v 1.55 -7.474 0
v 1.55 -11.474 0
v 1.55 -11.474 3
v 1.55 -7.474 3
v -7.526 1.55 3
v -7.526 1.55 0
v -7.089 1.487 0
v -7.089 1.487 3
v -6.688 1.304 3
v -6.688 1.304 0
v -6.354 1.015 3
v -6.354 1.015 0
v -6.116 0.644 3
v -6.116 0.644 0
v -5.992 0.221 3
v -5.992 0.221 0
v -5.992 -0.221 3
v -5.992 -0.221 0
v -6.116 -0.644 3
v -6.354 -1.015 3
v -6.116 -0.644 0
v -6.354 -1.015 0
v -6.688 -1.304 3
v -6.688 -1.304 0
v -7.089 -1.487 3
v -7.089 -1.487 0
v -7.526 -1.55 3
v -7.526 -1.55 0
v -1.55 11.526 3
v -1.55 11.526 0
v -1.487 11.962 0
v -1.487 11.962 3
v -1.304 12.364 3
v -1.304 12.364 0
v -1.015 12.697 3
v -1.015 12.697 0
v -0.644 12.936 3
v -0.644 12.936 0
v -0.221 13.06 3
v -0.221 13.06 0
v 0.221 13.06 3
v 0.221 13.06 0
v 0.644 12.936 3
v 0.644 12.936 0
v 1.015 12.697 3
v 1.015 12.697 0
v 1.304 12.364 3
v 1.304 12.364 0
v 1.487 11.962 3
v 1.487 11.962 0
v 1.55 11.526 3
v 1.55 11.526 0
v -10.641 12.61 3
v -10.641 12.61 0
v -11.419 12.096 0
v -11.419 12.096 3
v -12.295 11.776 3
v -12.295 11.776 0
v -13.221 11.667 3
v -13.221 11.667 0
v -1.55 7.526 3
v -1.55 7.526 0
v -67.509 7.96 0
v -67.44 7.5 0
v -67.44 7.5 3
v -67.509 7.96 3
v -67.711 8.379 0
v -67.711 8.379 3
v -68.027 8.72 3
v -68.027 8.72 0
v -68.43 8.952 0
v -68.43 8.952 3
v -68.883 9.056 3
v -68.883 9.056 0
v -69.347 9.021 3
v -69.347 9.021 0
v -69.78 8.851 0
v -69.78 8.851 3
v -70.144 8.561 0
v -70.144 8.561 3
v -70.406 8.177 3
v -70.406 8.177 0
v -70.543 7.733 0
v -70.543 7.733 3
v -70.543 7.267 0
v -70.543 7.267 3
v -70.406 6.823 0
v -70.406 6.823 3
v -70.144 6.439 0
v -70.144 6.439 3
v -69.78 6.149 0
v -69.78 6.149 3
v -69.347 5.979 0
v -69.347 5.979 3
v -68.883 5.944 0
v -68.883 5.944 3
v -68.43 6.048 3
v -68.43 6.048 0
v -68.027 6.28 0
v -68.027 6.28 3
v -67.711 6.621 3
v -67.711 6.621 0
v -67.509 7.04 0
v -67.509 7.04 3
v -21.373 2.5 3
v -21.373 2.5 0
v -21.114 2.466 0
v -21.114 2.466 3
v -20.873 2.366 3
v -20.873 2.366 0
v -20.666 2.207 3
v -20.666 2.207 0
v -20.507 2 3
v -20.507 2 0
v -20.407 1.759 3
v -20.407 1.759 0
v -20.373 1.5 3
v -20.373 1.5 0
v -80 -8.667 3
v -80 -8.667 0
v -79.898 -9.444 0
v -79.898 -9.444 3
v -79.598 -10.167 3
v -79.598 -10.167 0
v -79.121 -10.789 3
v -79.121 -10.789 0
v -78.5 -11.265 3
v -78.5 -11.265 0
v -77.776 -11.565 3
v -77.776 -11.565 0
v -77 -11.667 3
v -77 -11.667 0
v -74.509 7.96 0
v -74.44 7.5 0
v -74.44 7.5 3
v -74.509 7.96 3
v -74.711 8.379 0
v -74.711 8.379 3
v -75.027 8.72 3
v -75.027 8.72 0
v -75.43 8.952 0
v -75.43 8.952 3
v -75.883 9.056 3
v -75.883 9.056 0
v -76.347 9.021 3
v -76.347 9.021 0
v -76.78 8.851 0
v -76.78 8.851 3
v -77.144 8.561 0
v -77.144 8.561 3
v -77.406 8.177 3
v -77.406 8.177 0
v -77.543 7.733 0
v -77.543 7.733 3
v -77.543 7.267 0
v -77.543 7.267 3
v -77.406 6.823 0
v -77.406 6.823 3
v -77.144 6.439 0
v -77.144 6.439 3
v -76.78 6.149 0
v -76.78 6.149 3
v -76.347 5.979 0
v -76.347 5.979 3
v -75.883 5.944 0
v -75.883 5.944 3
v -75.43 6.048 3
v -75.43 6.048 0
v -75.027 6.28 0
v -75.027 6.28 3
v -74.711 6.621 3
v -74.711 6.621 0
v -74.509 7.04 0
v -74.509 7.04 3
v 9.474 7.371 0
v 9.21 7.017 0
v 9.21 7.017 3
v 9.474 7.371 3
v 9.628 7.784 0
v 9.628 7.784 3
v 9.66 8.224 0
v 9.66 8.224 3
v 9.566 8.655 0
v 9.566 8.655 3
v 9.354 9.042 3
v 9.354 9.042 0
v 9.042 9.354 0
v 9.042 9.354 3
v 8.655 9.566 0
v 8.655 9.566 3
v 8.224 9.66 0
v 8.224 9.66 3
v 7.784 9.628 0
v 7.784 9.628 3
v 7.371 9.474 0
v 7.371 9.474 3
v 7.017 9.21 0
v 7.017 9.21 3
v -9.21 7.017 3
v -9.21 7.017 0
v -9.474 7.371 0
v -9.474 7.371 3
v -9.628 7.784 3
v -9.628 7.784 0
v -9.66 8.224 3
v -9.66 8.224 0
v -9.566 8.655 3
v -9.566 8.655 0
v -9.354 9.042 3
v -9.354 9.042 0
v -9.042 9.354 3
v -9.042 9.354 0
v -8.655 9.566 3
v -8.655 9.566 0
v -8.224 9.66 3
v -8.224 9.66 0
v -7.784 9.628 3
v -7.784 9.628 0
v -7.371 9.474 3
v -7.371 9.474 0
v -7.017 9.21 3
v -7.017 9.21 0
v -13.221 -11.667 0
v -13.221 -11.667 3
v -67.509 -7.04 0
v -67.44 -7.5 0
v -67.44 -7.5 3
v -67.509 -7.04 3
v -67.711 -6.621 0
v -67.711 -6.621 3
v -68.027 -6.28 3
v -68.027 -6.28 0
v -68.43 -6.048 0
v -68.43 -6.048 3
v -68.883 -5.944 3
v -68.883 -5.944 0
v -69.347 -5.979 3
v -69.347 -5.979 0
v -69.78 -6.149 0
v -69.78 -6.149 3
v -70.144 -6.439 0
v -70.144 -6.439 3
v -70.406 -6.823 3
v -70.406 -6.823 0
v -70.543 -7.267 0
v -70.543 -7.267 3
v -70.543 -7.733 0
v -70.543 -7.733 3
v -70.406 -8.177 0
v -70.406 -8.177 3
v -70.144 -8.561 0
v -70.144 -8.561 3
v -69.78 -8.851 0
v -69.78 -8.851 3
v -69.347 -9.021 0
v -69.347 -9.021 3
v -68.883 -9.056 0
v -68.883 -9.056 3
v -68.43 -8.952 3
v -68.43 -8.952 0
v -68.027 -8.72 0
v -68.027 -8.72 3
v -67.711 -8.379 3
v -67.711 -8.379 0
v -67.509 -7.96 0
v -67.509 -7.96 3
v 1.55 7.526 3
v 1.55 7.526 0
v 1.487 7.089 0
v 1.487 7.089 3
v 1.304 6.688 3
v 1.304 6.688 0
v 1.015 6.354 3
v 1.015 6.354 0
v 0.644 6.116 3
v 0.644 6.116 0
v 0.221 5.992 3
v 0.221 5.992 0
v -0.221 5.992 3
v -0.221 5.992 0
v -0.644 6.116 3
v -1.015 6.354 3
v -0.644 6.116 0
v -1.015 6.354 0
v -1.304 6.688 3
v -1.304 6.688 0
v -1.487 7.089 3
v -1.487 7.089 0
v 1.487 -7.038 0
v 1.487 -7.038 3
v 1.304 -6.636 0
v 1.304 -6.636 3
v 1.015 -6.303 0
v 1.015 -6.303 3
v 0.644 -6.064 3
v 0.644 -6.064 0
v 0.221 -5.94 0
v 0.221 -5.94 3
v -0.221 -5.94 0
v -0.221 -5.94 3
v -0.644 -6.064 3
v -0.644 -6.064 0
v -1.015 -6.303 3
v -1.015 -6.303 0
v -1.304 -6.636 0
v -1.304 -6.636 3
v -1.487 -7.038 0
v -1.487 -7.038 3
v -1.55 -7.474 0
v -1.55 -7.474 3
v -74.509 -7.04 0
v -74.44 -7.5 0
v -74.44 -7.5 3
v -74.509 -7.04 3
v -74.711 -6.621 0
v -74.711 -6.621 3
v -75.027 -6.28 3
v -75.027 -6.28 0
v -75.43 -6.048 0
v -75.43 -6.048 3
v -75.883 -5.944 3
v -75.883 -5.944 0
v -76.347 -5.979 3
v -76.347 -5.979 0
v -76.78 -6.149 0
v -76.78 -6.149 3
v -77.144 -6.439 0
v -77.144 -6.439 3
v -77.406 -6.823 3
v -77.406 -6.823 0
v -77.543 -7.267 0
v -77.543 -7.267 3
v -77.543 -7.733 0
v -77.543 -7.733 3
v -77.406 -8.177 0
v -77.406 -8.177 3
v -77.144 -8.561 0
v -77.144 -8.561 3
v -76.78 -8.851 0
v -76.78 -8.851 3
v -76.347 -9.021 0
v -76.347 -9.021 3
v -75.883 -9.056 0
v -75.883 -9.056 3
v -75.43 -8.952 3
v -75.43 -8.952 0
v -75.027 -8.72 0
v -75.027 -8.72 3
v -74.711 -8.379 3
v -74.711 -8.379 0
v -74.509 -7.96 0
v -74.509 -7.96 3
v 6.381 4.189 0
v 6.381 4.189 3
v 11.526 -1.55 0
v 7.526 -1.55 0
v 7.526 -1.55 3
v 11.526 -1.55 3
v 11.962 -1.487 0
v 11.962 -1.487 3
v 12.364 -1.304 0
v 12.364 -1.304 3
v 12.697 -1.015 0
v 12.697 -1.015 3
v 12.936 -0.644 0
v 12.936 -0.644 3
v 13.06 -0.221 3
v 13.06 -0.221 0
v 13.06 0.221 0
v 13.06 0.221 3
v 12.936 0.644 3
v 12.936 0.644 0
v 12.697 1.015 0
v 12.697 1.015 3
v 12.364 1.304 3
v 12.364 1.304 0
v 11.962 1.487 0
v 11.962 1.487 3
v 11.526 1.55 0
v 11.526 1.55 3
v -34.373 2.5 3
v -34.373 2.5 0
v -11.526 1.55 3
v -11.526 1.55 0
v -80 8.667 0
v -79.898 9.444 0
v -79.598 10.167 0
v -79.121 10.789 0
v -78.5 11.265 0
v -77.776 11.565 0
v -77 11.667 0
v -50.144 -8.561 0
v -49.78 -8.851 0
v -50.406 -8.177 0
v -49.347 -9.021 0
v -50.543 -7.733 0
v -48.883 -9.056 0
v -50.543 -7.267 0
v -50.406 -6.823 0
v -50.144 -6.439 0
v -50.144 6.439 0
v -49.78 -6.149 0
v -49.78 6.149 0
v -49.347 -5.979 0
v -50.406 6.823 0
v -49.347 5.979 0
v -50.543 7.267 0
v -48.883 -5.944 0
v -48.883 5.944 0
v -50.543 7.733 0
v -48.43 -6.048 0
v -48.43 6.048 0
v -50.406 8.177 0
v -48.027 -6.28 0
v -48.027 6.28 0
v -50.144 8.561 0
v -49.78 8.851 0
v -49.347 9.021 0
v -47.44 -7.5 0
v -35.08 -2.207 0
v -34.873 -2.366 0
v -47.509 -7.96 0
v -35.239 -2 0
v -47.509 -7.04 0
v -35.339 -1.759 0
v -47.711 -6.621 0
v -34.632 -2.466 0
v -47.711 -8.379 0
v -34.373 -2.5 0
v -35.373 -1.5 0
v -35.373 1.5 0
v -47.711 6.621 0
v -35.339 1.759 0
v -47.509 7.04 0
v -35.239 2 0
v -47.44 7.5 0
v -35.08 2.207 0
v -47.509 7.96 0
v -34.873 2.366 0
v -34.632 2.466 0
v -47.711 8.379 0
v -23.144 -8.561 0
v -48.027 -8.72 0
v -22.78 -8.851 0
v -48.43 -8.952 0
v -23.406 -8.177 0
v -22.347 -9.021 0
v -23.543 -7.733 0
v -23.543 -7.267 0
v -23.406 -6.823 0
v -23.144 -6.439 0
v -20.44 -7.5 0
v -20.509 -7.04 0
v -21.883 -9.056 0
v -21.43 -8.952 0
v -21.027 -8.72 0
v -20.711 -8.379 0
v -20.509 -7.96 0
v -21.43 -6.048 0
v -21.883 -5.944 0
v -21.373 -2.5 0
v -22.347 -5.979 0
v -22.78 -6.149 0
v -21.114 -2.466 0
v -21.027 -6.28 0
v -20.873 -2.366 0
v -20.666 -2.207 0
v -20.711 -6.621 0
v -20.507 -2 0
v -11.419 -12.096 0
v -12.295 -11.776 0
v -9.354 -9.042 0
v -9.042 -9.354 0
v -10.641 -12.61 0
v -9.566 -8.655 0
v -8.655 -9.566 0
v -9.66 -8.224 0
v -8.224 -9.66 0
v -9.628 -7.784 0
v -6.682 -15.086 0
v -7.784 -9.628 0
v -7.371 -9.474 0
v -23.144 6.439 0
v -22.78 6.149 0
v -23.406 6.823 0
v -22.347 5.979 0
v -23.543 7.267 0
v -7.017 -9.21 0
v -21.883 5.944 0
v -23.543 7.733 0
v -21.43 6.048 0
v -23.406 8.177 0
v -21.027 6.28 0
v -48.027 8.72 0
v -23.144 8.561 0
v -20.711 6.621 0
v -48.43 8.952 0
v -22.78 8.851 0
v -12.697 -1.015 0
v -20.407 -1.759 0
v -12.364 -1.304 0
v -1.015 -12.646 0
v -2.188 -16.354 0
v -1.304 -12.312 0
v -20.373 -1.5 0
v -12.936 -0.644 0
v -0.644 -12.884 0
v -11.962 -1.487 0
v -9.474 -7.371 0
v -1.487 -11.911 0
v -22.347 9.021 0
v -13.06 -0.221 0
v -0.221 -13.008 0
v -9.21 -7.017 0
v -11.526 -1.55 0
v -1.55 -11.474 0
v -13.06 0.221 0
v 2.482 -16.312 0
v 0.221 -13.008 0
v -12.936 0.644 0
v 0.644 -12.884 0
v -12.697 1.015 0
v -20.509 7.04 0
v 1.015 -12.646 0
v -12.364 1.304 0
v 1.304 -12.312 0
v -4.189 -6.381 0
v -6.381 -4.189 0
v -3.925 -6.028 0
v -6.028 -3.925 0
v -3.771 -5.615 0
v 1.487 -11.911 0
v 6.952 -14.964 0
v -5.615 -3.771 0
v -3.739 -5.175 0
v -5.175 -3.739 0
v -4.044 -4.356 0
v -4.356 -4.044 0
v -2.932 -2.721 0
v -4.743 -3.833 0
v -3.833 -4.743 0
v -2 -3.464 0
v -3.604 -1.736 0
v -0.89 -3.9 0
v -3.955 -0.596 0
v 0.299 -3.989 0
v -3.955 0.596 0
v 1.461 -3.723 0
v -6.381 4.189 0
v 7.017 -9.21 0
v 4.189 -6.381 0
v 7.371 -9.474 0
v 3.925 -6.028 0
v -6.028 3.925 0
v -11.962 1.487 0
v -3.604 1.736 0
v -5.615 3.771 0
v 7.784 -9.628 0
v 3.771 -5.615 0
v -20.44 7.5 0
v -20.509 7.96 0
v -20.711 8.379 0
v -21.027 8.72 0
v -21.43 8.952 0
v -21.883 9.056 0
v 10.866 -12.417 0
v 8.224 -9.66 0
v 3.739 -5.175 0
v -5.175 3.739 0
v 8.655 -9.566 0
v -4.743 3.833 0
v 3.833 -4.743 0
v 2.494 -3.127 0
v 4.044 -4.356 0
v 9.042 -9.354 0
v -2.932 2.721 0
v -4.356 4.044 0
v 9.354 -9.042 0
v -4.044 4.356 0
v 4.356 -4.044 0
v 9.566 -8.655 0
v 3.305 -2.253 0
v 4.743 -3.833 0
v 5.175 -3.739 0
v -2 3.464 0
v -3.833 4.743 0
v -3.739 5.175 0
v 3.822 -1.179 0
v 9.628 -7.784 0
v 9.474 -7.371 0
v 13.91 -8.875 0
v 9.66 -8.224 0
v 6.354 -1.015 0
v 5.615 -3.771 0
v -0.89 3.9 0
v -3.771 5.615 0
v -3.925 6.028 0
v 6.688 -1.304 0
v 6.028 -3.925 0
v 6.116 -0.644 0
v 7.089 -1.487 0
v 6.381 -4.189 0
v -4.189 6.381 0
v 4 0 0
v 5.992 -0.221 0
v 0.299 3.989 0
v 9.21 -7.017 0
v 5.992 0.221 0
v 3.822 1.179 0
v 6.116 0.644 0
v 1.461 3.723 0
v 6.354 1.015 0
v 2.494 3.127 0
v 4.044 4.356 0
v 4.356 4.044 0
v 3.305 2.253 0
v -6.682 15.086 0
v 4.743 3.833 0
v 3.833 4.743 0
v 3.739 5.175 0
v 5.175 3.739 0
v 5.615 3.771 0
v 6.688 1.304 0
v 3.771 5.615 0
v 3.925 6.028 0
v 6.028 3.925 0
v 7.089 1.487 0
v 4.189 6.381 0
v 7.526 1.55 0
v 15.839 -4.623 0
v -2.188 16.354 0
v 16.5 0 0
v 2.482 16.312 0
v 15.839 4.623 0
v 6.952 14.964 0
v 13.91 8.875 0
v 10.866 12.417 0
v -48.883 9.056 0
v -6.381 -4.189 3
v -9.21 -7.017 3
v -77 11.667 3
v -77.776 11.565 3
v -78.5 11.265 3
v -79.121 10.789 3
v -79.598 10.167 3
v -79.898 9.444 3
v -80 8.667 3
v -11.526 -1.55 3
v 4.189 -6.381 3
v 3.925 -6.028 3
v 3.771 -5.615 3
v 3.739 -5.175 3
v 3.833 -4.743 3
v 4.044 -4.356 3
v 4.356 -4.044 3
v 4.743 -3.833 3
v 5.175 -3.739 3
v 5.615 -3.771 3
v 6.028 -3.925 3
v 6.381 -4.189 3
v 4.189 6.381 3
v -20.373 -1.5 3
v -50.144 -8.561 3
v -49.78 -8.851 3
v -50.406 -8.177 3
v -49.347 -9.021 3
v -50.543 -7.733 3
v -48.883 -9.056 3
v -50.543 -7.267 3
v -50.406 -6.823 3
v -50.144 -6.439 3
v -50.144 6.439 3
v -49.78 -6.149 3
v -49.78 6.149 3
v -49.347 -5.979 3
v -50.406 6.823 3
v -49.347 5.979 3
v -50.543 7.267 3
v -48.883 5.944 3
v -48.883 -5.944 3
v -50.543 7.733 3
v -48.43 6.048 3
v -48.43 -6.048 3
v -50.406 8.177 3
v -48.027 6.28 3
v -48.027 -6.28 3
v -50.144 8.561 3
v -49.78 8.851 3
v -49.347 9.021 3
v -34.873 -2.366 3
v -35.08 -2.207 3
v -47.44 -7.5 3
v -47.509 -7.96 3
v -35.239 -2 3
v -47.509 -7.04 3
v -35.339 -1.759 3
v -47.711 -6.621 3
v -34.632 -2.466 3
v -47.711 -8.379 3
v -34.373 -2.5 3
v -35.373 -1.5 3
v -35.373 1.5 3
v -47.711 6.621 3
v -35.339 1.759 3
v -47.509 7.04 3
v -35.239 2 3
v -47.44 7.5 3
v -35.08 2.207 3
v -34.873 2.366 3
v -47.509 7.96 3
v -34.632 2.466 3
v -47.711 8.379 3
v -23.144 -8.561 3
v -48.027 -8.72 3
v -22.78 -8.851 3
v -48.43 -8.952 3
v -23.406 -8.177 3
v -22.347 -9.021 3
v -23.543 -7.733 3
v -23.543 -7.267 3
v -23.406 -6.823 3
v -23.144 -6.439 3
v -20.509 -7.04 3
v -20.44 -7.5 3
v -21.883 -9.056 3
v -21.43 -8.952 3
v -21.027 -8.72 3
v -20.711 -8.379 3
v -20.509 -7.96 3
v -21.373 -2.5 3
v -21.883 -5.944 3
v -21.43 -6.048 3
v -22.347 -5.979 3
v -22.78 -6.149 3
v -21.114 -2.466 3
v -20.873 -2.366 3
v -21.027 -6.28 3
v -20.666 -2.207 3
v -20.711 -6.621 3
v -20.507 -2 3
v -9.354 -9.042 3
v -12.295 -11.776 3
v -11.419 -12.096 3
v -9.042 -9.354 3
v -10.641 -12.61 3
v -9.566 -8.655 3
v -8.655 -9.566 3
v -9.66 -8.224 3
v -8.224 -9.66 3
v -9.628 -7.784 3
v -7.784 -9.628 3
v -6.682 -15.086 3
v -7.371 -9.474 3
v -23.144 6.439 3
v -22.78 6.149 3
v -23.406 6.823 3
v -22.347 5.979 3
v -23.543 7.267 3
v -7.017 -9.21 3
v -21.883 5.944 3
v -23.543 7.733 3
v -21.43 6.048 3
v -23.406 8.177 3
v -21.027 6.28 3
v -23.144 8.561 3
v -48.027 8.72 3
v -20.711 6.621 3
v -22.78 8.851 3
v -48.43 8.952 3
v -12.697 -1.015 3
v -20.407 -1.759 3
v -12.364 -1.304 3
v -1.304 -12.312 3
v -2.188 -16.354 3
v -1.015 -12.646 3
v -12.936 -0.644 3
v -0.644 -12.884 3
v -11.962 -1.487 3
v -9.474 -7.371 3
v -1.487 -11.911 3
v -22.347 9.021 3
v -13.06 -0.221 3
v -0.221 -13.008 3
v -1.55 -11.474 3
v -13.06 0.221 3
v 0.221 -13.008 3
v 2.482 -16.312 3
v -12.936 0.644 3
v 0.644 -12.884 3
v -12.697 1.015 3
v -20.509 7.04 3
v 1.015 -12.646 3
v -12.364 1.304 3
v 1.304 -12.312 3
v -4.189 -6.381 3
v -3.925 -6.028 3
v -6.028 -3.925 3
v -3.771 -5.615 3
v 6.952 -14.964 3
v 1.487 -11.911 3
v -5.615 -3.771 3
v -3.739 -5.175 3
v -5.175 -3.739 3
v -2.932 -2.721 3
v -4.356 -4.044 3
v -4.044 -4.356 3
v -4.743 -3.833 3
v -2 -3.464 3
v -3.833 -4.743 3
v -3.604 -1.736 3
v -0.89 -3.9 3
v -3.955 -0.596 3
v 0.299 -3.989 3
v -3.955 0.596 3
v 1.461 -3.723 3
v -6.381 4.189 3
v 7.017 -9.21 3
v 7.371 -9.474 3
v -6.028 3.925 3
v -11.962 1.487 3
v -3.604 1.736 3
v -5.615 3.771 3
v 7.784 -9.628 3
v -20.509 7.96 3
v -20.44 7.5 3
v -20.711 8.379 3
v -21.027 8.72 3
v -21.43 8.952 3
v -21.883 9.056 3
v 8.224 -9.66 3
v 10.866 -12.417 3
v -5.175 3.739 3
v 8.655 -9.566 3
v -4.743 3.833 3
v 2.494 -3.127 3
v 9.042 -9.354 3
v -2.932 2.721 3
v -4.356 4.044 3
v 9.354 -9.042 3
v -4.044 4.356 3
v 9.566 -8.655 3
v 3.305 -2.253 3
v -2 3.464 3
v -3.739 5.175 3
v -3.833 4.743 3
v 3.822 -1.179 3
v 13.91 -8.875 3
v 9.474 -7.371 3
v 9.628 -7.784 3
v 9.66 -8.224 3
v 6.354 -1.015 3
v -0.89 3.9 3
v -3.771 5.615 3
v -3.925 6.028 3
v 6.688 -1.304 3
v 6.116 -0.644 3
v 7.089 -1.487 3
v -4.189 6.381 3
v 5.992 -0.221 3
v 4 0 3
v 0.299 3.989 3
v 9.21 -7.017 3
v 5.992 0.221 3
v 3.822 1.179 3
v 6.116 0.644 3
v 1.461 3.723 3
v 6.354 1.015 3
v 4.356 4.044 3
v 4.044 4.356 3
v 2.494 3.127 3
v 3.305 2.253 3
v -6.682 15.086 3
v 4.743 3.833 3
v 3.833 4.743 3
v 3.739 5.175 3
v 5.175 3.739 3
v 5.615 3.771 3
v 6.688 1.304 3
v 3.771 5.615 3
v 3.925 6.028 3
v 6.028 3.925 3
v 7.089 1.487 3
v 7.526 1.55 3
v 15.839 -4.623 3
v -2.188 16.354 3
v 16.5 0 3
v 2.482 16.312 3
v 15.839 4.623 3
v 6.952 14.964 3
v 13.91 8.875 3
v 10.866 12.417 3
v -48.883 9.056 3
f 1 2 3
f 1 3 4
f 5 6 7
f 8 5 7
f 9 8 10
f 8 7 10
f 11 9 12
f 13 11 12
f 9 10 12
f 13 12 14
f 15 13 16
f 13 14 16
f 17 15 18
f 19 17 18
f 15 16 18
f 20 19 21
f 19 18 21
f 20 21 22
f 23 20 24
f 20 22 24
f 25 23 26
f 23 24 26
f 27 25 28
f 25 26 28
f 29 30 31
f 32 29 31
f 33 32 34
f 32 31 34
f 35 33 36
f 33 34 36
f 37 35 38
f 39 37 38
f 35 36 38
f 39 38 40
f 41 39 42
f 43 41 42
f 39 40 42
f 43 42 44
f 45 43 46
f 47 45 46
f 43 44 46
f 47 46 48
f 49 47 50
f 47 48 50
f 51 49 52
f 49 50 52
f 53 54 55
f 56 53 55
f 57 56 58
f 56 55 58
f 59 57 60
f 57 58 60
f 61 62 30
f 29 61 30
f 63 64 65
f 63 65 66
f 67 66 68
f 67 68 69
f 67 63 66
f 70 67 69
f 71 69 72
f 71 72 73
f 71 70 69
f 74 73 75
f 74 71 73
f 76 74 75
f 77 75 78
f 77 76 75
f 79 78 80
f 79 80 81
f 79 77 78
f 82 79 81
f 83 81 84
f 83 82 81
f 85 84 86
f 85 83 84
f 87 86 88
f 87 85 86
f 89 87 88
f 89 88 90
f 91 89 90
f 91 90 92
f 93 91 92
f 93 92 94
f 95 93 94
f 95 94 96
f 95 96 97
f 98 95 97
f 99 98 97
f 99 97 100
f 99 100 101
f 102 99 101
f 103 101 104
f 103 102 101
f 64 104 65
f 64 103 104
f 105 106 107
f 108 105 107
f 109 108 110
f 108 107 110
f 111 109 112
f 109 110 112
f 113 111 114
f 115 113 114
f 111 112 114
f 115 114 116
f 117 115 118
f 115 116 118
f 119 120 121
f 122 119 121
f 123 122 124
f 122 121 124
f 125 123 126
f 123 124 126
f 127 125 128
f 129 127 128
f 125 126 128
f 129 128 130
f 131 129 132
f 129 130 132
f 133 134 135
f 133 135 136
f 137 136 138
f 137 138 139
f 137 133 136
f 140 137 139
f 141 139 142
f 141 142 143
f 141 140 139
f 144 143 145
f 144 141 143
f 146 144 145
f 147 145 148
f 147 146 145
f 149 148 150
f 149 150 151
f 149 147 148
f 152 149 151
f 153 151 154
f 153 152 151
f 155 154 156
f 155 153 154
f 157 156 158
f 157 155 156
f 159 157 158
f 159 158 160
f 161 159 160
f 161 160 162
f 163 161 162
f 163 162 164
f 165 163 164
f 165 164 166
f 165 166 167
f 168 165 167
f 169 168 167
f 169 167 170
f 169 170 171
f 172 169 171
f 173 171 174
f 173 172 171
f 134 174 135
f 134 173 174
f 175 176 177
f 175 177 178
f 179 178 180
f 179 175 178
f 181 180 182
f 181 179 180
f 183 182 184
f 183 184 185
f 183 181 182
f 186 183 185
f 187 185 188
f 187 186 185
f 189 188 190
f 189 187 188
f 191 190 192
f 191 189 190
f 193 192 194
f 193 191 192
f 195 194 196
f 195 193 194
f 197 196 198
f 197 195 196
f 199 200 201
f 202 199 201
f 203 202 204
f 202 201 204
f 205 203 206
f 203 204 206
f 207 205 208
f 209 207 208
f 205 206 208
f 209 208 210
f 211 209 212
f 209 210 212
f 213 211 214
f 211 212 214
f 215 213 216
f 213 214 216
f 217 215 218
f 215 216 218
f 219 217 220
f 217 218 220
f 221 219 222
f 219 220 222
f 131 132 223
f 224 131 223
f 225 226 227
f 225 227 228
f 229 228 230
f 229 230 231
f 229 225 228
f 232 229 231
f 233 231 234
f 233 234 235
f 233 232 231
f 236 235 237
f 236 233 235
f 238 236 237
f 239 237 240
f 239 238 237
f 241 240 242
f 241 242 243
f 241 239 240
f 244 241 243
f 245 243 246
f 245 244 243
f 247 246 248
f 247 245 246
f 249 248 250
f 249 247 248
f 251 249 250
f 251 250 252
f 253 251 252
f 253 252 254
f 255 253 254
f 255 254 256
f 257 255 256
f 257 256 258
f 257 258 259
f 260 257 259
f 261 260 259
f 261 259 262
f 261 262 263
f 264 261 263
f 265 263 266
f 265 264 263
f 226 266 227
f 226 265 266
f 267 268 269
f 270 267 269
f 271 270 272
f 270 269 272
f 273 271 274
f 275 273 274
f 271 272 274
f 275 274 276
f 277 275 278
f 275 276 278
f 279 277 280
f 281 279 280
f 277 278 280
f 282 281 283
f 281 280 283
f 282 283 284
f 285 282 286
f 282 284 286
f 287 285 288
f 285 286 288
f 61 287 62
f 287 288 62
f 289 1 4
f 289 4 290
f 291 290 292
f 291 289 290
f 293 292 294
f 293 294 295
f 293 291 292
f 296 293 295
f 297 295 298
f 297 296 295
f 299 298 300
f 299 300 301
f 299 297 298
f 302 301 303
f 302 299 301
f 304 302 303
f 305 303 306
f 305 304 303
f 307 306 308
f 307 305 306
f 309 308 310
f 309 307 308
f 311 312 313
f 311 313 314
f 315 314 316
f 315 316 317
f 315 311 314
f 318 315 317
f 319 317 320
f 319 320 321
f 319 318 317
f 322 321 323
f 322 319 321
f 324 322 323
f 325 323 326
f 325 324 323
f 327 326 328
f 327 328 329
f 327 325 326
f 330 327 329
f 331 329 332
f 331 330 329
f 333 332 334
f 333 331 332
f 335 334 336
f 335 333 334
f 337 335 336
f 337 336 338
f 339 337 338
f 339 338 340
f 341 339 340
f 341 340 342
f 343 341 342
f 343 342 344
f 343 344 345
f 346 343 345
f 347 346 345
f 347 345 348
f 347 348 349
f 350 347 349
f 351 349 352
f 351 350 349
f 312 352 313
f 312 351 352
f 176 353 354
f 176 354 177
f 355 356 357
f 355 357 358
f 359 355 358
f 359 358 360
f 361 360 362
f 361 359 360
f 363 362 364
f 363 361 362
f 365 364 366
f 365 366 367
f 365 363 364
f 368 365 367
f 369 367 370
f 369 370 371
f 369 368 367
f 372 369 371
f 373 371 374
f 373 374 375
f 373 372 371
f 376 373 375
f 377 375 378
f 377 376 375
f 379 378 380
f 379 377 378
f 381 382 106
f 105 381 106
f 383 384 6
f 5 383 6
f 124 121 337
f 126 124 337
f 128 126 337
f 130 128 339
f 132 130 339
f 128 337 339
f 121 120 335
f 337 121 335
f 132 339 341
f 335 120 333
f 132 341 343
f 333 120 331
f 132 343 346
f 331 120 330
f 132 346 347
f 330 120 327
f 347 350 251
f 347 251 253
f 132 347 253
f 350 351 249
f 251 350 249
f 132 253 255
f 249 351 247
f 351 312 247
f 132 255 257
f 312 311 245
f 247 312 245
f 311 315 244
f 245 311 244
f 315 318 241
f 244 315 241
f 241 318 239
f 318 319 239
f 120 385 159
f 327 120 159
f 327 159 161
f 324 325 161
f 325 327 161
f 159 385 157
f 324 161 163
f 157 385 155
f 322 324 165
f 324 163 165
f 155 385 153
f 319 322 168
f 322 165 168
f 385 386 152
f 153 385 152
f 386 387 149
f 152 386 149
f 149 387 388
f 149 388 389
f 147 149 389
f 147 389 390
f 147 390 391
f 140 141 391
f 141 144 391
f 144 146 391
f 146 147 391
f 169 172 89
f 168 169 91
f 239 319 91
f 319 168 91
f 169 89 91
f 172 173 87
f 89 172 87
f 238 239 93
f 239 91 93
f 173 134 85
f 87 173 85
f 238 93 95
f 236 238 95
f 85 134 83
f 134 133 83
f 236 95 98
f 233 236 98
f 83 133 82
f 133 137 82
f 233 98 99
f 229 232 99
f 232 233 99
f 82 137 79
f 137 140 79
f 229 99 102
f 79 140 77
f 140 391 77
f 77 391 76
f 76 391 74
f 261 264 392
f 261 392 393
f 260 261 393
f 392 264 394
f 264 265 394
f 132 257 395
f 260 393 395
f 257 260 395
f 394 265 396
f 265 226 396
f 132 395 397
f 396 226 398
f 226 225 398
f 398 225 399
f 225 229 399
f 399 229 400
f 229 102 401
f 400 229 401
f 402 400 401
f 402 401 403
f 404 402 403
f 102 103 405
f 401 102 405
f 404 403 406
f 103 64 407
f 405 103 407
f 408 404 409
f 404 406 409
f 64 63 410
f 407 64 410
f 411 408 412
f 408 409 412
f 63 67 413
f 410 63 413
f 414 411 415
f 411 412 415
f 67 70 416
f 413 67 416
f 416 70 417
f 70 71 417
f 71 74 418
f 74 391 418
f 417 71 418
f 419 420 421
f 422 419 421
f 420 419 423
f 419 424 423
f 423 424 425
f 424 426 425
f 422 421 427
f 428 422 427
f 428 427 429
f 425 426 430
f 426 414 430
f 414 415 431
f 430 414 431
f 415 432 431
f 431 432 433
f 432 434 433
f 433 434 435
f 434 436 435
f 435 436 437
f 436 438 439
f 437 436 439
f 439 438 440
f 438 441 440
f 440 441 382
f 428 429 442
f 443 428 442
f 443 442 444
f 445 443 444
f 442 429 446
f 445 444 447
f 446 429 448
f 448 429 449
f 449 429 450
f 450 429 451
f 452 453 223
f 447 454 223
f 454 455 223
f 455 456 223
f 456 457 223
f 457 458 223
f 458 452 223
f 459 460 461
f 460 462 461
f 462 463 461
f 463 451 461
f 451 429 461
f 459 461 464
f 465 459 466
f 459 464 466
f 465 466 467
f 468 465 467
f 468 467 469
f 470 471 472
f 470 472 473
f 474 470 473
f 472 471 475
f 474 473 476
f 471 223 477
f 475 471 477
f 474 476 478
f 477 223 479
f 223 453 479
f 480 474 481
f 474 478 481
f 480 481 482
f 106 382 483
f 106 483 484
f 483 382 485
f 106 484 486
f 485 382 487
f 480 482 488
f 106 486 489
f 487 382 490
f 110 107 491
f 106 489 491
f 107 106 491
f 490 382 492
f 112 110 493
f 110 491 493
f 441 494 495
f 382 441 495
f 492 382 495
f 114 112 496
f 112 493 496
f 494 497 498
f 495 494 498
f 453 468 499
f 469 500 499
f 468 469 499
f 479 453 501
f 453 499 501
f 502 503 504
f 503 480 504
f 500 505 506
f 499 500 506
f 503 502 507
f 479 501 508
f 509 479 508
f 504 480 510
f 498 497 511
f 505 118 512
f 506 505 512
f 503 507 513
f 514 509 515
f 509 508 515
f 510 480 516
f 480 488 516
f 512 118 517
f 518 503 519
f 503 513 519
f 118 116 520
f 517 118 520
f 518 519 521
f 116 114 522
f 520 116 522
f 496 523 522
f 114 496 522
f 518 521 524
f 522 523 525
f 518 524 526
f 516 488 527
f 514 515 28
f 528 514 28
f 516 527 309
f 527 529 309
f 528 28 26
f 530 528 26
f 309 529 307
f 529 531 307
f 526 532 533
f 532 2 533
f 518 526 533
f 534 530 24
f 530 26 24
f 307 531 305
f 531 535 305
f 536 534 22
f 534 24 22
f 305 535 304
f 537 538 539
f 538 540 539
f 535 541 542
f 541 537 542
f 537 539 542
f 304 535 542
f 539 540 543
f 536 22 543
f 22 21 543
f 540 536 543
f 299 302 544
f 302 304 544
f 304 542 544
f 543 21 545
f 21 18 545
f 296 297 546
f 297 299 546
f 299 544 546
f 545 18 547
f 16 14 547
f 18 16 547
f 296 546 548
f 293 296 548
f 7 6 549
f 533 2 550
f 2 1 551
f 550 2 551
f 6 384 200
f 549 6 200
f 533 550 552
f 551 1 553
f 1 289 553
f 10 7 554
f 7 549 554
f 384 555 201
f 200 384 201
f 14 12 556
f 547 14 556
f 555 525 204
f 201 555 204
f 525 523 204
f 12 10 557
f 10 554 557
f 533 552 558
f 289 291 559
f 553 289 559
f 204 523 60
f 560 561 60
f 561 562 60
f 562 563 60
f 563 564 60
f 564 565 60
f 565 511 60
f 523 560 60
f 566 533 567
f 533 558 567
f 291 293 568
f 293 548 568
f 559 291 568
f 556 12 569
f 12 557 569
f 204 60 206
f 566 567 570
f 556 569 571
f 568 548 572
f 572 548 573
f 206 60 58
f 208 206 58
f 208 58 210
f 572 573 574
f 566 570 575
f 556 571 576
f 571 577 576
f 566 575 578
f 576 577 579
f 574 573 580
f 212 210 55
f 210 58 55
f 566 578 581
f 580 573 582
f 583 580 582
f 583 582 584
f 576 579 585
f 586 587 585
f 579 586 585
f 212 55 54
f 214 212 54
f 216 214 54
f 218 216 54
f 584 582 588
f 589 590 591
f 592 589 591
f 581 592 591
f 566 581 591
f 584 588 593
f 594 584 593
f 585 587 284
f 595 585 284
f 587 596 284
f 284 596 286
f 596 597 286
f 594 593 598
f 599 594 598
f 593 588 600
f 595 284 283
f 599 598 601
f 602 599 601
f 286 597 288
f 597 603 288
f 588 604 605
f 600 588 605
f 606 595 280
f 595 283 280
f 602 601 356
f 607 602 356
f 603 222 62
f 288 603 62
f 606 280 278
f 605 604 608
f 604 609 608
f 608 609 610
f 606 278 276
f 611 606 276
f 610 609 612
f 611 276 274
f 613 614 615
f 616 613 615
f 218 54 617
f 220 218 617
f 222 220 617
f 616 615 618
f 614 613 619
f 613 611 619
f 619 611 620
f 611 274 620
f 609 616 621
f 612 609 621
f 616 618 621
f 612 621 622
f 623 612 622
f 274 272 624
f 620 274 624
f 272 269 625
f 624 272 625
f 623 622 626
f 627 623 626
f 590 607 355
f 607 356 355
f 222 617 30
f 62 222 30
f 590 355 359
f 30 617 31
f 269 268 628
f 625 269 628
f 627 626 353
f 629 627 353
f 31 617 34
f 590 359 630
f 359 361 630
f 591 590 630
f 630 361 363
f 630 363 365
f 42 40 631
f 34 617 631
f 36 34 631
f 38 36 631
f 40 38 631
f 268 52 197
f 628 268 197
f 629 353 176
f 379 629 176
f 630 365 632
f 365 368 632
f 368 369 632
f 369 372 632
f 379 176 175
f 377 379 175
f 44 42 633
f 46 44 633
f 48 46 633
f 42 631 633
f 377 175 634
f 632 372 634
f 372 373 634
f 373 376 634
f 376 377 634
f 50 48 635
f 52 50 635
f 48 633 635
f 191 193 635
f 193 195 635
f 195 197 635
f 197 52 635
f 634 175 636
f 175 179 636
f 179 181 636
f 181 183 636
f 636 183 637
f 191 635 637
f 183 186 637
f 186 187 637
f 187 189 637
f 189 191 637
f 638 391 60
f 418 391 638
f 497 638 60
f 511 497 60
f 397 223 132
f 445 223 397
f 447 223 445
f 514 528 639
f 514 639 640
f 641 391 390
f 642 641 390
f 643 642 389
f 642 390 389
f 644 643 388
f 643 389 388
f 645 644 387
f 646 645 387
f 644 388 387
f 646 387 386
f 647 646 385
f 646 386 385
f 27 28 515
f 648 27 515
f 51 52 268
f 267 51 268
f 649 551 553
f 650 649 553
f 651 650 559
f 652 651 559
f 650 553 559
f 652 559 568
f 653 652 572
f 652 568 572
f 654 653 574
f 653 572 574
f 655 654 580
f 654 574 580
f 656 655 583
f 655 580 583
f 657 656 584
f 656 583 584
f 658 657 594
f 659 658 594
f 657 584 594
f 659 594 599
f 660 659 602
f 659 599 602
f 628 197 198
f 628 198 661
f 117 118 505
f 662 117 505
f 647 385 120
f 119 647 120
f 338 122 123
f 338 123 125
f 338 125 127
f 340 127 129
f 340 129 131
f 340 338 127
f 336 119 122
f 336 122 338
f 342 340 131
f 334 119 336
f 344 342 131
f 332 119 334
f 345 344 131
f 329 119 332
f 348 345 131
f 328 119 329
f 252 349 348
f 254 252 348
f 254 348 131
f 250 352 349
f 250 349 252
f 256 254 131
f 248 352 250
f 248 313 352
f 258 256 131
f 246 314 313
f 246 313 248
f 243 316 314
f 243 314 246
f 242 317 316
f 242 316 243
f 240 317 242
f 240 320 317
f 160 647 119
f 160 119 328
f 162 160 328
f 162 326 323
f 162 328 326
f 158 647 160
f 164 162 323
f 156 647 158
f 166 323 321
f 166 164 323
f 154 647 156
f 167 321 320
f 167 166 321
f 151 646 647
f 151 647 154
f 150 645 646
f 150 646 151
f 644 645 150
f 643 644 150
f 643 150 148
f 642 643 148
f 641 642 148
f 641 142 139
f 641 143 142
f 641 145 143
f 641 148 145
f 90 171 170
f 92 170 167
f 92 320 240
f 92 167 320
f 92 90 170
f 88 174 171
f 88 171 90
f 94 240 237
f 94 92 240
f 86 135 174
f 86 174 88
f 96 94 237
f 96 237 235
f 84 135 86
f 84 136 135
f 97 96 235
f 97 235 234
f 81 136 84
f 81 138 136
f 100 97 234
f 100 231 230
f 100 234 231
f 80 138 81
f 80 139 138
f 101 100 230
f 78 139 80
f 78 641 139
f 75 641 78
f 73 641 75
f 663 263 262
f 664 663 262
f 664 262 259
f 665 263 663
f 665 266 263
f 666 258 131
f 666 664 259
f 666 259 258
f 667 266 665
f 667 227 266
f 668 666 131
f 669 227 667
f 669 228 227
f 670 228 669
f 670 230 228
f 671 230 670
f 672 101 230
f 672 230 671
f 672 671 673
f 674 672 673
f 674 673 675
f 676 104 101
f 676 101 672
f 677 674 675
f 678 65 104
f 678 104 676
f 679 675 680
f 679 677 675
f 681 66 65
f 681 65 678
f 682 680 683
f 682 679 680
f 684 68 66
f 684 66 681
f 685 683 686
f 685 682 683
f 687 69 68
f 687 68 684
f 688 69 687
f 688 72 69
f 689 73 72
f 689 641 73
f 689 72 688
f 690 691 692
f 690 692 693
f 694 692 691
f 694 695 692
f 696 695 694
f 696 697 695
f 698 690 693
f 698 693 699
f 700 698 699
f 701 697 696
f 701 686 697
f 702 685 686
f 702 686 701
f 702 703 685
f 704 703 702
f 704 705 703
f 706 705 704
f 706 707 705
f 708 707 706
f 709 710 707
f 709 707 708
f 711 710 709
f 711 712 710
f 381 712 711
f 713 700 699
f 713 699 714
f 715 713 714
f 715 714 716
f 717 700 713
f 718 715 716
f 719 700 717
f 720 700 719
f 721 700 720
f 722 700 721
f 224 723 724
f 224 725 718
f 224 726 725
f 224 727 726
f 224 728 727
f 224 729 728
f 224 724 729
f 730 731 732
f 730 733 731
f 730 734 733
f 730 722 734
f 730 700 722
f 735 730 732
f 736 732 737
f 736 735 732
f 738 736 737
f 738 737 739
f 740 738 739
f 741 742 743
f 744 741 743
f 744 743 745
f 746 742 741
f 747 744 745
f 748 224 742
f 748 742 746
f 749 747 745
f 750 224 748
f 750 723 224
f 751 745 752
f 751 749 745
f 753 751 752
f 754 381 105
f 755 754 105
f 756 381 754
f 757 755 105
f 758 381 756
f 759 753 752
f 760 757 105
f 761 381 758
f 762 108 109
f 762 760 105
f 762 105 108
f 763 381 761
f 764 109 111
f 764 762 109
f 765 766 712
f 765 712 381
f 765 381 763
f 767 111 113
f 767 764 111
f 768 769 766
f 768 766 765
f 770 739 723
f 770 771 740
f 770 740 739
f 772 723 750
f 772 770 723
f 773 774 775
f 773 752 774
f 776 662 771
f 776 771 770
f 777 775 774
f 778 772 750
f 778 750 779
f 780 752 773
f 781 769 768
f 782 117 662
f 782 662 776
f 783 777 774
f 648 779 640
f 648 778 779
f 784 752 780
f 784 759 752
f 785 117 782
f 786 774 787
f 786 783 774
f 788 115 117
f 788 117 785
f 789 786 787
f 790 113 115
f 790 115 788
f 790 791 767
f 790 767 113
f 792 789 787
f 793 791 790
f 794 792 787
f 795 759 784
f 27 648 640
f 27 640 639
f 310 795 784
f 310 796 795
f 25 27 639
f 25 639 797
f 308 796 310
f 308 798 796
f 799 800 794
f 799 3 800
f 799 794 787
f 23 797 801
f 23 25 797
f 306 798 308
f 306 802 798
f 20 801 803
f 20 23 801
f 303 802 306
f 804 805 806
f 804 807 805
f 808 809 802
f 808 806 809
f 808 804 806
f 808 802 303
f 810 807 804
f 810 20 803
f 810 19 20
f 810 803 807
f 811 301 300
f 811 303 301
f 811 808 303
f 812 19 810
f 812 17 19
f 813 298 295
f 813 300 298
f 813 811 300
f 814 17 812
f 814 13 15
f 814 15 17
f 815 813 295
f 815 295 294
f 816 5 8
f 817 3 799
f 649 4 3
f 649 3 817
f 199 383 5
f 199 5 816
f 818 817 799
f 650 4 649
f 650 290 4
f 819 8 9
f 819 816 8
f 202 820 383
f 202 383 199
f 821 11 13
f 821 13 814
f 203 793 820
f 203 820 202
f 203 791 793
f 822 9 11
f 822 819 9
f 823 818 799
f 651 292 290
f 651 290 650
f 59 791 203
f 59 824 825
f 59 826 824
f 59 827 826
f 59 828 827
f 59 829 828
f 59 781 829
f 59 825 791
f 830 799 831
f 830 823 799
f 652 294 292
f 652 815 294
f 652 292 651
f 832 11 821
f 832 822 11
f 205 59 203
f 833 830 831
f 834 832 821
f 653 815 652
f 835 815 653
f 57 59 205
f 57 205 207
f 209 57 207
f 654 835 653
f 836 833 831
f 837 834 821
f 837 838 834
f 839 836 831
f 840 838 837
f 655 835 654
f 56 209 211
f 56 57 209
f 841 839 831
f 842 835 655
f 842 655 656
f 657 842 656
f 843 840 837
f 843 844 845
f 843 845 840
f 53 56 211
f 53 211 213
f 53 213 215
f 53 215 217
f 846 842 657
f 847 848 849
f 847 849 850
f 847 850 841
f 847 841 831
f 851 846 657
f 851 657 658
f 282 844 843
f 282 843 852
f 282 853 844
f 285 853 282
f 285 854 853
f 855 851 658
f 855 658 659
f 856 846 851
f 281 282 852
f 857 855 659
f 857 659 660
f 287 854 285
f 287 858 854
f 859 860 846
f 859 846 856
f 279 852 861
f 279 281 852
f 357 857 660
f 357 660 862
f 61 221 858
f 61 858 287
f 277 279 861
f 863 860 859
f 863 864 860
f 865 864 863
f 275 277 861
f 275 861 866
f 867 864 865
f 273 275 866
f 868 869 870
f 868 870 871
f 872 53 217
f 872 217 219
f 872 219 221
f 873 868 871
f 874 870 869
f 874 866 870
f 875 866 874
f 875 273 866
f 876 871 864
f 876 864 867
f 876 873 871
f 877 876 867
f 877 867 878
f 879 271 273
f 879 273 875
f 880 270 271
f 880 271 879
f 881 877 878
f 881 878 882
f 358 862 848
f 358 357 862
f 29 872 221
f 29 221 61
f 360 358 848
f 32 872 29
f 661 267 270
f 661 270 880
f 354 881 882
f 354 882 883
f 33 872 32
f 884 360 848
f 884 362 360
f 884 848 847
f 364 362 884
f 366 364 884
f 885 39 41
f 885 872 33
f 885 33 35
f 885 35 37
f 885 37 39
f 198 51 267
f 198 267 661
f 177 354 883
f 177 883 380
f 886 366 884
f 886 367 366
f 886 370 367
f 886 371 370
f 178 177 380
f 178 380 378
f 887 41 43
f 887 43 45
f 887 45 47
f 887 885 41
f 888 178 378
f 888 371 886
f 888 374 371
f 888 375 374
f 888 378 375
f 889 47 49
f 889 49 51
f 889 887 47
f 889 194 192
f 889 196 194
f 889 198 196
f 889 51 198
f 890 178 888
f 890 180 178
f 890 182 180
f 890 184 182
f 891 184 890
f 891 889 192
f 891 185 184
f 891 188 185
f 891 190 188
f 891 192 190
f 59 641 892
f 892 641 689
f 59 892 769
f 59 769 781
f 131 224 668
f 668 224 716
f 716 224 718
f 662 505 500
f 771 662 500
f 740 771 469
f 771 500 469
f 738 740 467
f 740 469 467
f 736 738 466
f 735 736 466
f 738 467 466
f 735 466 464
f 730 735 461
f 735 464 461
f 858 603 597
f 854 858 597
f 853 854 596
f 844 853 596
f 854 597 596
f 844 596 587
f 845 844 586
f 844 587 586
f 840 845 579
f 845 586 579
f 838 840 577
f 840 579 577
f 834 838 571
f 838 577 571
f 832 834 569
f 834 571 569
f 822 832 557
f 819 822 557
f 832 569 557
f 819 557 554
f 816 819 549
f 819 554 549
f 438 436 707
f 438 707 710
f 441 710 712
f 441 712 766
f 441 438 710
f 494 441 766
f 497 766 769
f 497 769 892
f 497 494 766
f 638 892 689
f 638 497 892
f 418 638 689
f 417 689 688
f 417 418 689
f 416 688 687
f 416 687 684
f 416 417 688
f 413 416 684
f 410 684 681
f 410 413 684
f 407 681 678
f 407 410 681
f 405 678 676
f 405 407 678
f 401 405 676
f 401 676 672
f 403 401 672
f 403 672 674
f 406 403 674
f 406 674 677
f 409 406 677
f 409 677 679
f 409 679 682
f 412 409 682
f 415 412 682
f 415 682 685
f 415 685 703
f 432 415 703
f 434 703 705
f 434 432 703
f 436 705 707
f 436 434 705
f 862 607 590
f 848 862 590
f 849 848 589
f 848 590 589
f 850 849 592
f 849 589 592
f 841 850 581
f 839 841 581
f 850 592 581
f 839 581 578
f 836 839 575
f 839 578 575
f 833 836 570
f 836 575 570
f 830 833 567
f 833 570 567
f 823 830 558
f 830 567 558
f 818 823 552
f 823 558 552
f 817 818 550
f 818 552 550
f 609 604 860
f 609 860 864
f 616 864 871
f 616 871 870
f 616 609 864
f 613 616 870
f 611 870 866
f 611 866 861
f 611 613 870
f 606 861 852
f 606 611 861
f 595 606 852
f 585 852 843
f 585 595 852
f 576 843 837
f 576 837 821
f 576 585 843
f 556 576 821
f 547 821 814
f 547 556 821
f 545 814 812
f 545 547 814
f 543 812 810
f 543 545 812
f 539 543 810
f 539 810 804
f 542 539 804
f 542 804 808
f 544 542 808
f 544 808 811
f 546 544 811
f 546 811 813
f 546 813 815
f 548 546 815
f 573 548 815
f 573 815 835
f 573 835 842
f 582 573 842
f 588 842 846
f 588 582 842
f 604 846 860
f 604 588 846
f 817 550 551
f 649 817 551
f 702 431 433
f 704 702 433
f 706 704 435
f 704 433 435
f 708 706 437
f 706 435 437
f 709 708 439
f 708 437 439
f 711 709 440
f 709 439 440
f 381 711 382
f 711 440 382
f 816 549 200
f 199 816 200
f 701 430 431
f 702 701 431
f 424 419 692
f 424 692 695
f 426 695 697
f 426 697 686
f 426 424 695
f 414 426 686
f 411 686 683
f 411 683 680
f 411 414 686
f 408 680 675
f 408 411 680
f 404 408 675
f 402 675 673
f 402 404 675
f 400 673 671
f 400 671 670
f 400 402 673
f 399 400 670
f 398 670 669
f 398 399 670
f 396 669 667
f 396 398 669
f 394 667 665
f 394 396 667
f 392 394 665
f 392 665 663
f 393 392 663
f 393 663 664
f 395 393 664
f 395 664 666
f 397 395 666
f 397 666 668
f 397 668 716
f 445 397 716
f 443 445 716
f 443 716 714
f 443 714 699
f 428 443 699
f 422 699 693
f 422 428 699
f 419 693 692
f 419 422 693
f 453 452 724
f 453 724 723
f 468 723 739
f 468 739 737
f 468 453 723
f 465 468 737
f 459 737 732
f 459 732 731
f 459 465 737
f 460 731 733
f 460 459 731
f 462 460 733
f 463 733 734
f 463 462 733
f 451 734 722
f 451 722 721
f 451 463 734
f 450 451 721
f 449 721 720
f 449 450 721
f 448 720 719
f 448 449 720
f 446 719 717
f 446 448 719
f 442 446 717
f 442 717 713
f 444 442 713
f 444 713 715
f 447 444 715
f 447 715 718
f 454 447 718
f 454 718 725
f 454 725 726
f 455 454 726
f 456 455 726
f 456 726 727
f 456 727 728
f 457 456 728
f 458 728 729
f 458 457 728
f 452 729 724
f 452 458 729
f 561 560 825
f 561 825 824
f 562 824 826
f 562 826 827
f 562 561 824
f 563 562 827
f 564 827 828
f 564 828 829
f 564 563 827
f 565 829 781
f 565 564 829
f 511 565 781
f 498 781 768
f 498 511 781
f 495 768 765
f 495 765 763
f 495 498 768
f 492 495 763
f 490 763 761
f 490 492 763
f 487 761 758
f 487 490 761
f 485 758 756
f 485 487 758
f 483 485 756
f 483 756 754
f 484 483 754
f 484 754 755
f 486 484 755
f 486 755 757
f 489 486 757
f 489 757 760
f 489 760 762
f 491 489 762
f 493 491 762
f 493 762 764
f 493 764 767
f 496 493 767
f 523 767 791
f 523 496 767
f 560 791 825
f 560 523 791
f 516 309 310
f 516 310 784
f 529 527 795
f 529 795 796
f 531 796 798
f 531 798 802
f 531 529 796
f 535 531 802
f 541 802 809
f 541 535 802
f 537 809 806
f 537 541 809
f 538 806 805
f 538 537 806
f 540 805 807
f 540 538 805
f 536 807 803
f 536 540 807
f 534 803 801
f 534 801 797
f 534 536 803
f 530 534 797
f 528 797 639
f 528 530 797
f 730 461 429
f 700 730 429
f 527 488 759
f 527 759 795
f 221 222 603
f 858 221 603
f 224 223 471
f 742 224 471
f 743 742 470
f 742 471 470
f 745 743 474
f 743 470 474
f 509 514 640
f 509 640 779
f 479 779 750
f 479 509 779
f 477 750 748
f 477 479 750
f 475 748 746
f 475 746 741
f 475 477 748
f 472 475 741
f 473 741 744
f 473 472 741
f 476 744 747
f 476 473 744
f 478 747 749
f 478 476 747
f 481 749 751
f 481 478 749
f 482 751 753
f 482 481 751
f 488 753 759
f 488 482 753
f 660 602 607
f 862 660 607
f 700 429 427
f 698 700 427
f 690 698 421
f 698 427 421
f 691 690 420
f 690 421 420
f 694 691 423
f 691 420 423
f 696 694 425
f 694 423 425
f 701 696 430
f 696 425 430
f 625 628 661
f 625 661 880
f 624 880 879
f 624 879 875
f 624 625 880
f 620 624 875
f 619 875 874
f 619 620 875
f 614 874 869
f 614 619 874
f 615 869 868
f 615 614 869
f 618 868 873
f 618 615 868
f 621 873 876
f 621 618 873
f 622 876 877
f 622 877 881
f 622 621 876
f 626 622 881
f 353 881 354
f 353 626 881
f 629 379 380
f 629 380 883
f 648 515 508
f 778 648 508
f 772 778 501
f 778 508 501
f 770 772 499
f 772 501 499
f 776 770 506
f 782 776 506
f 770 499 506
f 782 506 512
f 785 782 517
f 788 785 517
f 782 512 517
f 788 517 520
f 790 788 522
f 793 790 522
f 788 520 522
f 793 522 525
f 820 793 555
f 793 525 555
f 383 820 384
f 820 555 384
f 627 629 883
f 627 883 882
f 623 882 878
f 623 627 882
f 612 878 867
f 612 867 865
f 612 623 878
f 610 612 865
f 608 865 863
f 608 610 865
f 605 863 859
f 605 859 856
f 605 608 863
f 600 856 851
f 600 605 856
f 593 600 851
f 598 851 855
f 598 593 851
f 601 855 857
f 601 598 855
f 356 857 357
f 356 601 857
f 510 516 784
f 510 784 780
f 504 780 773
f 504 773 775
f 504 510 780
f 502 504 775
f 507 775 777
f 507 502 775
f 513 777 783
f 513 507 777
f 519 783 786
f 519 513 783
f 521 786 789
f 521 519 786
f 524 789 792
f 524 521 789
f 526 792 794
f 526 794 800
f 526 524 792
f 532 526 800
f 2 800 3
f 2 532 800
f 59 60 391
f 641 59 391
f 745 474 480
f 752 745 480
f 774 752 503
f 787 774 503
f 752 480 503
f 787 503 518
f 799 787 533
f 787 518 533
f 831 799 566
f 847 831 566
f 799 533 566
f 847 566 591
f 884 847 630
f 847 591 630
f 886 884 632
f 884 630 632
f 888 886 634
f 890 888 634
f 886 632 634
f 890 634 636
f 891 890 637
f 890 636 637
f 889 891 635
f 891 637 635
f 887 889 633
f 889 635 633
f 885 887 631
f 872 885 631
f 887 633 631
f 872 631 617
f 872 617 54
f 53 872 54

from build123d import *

# Parameters (mm, degrees)
SKETCH_1_R      = 4
SKETCH_1_R_2    = 1.56
EXTRUDE_3_DEPTH = 3


with BuildPart() as part:
    # 草图1 → 凸台-拉伸3 (new body)
    with BuildSketch(Plane.XY):
        with BuildLine():
            Line((-13.220699864, 11.66726189), (-77, 11.66726189))
            ThreePointArc((-77, 11.66726189), (-79.121320344, 10.788582233), (-80, 8.66726189))
            Line((-80, 8.66726189), (-80, -8.66726189))
            ThreePointArc((-80, -8.66726189), (-79.121320344, -10.788582233), (-77, -11.66726189))
            Line((-77, -11.66726189), (-13.220699864, -11.66726189))
            ThreePointArc((-13.220699864, -11.66726189), (-11.847402161, -11.910394389), (-10.64105111, -12.610235179))
            ThreePointArc((-10.64105111, -12.610235179), (16.5, 0), (-10.64105111, 12.610235179))
            ThreePointArc((-10.64105111, 12.610235179), (-11.847402161, 11.910394389), (-13.220699864, 11.66726189))
        make_face()
        Circle(SKETCH_1_R, mode=Mode.SUBTRACT)
        with Locations((-76, 7.5)):
            Circle(SKETCH_1_R_2, mode=Mode.SUBTRACT)
        with Locations((-76, -7.5)):
            Circle(SKETCH_1_R_2, mode=Mode.SUBTRACT)
        with Locations((-69, 7.5)):
            Circle(SKETCH_1_R_2, mode=Mode.SUBTRACT)
        with Locations((-69, -7.5)):
            Circle(SKETCH_1_R_2, mode=Mode.SUBTRACT)
        with Locations((-49, 7.5)):
            Circle(SKETCH_1_R_2, mode=Mode.SUBTRACT)
        with Locations((-49, -7.5)):
            Circle(SKETCH_1_R_2, mode=Mode.SUBTRACT)
        with Locations((-22, 7.5)):
            Circle(SKETCH_1_R_2, mode=Mode.SUBTRACT)
        with Locations((-22, -7.5)):
            Circle(SKETCH_1_R_2, mode=Mode.SUBTRACT)
        with BuildLine():
            Line((-11.525767243, 1.55), (-7.525767243, 1.55))
            ThreePointArc((-7.525767243, 1.55), (-5.975767243, 0), (-7.525767243, -1.55))
            Line((-7.525767243, -1.55), (-11.525767243, -1.55))
            ThreePointArc((-11.525767243, -1.55), (-13.075767243, 0), (-11.525767243, 1.55))
        make_face(mode=Mode.SUBTRACT)
        with BuildLine():
            Line((11.525767243, 1.55), (7.525767243, 1.55))
            ThreePointArc((7.525767243, 1.55), (5.975767243, 0), (7.525767243, -1.55))
            Line((7.525767243, -1.55), (11.525767243, -1.55))
            ThreePointArc((11.525767243, -1.55), (13.075767243, 0), (11.525767243, 1.55))
        make_face(mode=Mode.SUBTRACT)
        with BuildLine():
            Line((-7.017492281, 9.209523303), (-4.189065156, 6.381096178))
            ThreePointArc((-4.189065156, 6.381096178), (-4.189065156, 4.189065156), (-6.381096178, 4.189065156))
            Line((-6.381096178, 4.189065156), (-9.209523303, 7.017492281))
            ThreePointArc((-9.209523303, 7.017492281), (-9.209523303, 9.209523303), (-7.017492281, 9.209523303))
        make_face(mode=Mode.SUBTRACT)
        with BuildLine():
            Line((1.55, -11.474232757), (1.55, -7.474232757))
            ThreePointArc((1.55, -7.474232757), (0, -5.924232757), (-1.55, -7.474232757))
            Line((-1.55, -7.474232757), (-1.55, -11.474232757))
            ThreePointArc((-1.55, -11.474232757), (0, -13.024232757), (1.55, -11.474232757))
        make_face(mode=Mode.SUBTRACT)
        with BuildLine():
            Line((1.55, 11.525767243), (1.55, 7.525767243))
            ThreePointArc((1.55, 7.525767243), (0, 5.975767243), (-1.55, 7.525767243))
            Line((-1.55, 7.525767243), (-1.55, 11.525767243))
            ThreePointArc((-1.55, 11.525767243), (0, 13.075767243), (1.55, 11.525767243))
        make_face(mode=Mode.SUBTRACT)
        with BuildLine():
            Line((7.017492281, 9.209523303), (4.189065156, 6.381096178))
            ThreePointArc((4.189065156, 6.381096178), (4.189065156, 4.189065156), (6.381096178, 4.189065156))
            Line((6.381096178, 4.189065156), (9.209523303, 7.017492281))
            ThreePointArc((9.209523303, 7.017492281), (9.209523303, 9.209523303), (7.017492281, 9.209523303))
        make_face(mode=Mode.SUBTRACT)
        with BuildLine():
            Line((-7.017492281, -9.209523303), (-4.189065156, -6.381096178))
            ThreePointArc((-4.189065156, -6.381096178), (-4.189065156, -4.189065156), (-6.381096178, -4.189065156))
            Line((-6.381096178, -4.189065156), (-9.209523303, -7.017492281))
            ThreePointArc((-9.209523303, -7.017492281), (-9.209523303, -9.209523303), (-7.017492281, -9.209523303))
        make_face(mode=Mode.SUBTRACT)
        with BuildLine():
            Line((7.017492281, -9.209523303), (4.189065156, -6.381096178))
            ThreePointArc((4.189065156, -6.381096178), (4.189065156, -4.189065156), (6.381096178, -4.189065156))
            Line((6.381096178, -4.189065156), (9.209523303, -7.017492281))
            ThreePointArc((9.209523303, -7.017492281), (9.209523303, -9.209523303), (7.017492281, -9.209523303))
        make_face(mode=Mode.SUBTRACT)
        with BuildLine():
            Line((-34.37331228, 2.5), (-21.37331228, 2.5))
            ThreePointArc((-21.37331228, 2.5), (-20.666205499, 2.207106781), (-20.37331228, 1.5))
            Line((-20.37331228, 1.5), (-20.37331228, -1.5))
            ThreePointArc((-20.37331228, -1.5), (-20.666205499, -2.207106781), (-21.37331228, -2.5))
            Line((-21.37331228, -2.5), (-34.37331228, -2.5))
            ThreePointArc((-34.37331228, -2.5), (-35.080419062, -2.207106781), (-35.37331228, -1.5))
            Line((-35.37331228, -1.5), (-35.37331228, 1.5))
            ThreePointArc((-35.37331228, 1.5), (-35.080419062, 2.207106781), (-34.37331228, 2.5))
        make_face(mode=Mode.SUBTRACT)
    extrude(amount=EXTRUDE_3_DEPTH)


solid = part.part
